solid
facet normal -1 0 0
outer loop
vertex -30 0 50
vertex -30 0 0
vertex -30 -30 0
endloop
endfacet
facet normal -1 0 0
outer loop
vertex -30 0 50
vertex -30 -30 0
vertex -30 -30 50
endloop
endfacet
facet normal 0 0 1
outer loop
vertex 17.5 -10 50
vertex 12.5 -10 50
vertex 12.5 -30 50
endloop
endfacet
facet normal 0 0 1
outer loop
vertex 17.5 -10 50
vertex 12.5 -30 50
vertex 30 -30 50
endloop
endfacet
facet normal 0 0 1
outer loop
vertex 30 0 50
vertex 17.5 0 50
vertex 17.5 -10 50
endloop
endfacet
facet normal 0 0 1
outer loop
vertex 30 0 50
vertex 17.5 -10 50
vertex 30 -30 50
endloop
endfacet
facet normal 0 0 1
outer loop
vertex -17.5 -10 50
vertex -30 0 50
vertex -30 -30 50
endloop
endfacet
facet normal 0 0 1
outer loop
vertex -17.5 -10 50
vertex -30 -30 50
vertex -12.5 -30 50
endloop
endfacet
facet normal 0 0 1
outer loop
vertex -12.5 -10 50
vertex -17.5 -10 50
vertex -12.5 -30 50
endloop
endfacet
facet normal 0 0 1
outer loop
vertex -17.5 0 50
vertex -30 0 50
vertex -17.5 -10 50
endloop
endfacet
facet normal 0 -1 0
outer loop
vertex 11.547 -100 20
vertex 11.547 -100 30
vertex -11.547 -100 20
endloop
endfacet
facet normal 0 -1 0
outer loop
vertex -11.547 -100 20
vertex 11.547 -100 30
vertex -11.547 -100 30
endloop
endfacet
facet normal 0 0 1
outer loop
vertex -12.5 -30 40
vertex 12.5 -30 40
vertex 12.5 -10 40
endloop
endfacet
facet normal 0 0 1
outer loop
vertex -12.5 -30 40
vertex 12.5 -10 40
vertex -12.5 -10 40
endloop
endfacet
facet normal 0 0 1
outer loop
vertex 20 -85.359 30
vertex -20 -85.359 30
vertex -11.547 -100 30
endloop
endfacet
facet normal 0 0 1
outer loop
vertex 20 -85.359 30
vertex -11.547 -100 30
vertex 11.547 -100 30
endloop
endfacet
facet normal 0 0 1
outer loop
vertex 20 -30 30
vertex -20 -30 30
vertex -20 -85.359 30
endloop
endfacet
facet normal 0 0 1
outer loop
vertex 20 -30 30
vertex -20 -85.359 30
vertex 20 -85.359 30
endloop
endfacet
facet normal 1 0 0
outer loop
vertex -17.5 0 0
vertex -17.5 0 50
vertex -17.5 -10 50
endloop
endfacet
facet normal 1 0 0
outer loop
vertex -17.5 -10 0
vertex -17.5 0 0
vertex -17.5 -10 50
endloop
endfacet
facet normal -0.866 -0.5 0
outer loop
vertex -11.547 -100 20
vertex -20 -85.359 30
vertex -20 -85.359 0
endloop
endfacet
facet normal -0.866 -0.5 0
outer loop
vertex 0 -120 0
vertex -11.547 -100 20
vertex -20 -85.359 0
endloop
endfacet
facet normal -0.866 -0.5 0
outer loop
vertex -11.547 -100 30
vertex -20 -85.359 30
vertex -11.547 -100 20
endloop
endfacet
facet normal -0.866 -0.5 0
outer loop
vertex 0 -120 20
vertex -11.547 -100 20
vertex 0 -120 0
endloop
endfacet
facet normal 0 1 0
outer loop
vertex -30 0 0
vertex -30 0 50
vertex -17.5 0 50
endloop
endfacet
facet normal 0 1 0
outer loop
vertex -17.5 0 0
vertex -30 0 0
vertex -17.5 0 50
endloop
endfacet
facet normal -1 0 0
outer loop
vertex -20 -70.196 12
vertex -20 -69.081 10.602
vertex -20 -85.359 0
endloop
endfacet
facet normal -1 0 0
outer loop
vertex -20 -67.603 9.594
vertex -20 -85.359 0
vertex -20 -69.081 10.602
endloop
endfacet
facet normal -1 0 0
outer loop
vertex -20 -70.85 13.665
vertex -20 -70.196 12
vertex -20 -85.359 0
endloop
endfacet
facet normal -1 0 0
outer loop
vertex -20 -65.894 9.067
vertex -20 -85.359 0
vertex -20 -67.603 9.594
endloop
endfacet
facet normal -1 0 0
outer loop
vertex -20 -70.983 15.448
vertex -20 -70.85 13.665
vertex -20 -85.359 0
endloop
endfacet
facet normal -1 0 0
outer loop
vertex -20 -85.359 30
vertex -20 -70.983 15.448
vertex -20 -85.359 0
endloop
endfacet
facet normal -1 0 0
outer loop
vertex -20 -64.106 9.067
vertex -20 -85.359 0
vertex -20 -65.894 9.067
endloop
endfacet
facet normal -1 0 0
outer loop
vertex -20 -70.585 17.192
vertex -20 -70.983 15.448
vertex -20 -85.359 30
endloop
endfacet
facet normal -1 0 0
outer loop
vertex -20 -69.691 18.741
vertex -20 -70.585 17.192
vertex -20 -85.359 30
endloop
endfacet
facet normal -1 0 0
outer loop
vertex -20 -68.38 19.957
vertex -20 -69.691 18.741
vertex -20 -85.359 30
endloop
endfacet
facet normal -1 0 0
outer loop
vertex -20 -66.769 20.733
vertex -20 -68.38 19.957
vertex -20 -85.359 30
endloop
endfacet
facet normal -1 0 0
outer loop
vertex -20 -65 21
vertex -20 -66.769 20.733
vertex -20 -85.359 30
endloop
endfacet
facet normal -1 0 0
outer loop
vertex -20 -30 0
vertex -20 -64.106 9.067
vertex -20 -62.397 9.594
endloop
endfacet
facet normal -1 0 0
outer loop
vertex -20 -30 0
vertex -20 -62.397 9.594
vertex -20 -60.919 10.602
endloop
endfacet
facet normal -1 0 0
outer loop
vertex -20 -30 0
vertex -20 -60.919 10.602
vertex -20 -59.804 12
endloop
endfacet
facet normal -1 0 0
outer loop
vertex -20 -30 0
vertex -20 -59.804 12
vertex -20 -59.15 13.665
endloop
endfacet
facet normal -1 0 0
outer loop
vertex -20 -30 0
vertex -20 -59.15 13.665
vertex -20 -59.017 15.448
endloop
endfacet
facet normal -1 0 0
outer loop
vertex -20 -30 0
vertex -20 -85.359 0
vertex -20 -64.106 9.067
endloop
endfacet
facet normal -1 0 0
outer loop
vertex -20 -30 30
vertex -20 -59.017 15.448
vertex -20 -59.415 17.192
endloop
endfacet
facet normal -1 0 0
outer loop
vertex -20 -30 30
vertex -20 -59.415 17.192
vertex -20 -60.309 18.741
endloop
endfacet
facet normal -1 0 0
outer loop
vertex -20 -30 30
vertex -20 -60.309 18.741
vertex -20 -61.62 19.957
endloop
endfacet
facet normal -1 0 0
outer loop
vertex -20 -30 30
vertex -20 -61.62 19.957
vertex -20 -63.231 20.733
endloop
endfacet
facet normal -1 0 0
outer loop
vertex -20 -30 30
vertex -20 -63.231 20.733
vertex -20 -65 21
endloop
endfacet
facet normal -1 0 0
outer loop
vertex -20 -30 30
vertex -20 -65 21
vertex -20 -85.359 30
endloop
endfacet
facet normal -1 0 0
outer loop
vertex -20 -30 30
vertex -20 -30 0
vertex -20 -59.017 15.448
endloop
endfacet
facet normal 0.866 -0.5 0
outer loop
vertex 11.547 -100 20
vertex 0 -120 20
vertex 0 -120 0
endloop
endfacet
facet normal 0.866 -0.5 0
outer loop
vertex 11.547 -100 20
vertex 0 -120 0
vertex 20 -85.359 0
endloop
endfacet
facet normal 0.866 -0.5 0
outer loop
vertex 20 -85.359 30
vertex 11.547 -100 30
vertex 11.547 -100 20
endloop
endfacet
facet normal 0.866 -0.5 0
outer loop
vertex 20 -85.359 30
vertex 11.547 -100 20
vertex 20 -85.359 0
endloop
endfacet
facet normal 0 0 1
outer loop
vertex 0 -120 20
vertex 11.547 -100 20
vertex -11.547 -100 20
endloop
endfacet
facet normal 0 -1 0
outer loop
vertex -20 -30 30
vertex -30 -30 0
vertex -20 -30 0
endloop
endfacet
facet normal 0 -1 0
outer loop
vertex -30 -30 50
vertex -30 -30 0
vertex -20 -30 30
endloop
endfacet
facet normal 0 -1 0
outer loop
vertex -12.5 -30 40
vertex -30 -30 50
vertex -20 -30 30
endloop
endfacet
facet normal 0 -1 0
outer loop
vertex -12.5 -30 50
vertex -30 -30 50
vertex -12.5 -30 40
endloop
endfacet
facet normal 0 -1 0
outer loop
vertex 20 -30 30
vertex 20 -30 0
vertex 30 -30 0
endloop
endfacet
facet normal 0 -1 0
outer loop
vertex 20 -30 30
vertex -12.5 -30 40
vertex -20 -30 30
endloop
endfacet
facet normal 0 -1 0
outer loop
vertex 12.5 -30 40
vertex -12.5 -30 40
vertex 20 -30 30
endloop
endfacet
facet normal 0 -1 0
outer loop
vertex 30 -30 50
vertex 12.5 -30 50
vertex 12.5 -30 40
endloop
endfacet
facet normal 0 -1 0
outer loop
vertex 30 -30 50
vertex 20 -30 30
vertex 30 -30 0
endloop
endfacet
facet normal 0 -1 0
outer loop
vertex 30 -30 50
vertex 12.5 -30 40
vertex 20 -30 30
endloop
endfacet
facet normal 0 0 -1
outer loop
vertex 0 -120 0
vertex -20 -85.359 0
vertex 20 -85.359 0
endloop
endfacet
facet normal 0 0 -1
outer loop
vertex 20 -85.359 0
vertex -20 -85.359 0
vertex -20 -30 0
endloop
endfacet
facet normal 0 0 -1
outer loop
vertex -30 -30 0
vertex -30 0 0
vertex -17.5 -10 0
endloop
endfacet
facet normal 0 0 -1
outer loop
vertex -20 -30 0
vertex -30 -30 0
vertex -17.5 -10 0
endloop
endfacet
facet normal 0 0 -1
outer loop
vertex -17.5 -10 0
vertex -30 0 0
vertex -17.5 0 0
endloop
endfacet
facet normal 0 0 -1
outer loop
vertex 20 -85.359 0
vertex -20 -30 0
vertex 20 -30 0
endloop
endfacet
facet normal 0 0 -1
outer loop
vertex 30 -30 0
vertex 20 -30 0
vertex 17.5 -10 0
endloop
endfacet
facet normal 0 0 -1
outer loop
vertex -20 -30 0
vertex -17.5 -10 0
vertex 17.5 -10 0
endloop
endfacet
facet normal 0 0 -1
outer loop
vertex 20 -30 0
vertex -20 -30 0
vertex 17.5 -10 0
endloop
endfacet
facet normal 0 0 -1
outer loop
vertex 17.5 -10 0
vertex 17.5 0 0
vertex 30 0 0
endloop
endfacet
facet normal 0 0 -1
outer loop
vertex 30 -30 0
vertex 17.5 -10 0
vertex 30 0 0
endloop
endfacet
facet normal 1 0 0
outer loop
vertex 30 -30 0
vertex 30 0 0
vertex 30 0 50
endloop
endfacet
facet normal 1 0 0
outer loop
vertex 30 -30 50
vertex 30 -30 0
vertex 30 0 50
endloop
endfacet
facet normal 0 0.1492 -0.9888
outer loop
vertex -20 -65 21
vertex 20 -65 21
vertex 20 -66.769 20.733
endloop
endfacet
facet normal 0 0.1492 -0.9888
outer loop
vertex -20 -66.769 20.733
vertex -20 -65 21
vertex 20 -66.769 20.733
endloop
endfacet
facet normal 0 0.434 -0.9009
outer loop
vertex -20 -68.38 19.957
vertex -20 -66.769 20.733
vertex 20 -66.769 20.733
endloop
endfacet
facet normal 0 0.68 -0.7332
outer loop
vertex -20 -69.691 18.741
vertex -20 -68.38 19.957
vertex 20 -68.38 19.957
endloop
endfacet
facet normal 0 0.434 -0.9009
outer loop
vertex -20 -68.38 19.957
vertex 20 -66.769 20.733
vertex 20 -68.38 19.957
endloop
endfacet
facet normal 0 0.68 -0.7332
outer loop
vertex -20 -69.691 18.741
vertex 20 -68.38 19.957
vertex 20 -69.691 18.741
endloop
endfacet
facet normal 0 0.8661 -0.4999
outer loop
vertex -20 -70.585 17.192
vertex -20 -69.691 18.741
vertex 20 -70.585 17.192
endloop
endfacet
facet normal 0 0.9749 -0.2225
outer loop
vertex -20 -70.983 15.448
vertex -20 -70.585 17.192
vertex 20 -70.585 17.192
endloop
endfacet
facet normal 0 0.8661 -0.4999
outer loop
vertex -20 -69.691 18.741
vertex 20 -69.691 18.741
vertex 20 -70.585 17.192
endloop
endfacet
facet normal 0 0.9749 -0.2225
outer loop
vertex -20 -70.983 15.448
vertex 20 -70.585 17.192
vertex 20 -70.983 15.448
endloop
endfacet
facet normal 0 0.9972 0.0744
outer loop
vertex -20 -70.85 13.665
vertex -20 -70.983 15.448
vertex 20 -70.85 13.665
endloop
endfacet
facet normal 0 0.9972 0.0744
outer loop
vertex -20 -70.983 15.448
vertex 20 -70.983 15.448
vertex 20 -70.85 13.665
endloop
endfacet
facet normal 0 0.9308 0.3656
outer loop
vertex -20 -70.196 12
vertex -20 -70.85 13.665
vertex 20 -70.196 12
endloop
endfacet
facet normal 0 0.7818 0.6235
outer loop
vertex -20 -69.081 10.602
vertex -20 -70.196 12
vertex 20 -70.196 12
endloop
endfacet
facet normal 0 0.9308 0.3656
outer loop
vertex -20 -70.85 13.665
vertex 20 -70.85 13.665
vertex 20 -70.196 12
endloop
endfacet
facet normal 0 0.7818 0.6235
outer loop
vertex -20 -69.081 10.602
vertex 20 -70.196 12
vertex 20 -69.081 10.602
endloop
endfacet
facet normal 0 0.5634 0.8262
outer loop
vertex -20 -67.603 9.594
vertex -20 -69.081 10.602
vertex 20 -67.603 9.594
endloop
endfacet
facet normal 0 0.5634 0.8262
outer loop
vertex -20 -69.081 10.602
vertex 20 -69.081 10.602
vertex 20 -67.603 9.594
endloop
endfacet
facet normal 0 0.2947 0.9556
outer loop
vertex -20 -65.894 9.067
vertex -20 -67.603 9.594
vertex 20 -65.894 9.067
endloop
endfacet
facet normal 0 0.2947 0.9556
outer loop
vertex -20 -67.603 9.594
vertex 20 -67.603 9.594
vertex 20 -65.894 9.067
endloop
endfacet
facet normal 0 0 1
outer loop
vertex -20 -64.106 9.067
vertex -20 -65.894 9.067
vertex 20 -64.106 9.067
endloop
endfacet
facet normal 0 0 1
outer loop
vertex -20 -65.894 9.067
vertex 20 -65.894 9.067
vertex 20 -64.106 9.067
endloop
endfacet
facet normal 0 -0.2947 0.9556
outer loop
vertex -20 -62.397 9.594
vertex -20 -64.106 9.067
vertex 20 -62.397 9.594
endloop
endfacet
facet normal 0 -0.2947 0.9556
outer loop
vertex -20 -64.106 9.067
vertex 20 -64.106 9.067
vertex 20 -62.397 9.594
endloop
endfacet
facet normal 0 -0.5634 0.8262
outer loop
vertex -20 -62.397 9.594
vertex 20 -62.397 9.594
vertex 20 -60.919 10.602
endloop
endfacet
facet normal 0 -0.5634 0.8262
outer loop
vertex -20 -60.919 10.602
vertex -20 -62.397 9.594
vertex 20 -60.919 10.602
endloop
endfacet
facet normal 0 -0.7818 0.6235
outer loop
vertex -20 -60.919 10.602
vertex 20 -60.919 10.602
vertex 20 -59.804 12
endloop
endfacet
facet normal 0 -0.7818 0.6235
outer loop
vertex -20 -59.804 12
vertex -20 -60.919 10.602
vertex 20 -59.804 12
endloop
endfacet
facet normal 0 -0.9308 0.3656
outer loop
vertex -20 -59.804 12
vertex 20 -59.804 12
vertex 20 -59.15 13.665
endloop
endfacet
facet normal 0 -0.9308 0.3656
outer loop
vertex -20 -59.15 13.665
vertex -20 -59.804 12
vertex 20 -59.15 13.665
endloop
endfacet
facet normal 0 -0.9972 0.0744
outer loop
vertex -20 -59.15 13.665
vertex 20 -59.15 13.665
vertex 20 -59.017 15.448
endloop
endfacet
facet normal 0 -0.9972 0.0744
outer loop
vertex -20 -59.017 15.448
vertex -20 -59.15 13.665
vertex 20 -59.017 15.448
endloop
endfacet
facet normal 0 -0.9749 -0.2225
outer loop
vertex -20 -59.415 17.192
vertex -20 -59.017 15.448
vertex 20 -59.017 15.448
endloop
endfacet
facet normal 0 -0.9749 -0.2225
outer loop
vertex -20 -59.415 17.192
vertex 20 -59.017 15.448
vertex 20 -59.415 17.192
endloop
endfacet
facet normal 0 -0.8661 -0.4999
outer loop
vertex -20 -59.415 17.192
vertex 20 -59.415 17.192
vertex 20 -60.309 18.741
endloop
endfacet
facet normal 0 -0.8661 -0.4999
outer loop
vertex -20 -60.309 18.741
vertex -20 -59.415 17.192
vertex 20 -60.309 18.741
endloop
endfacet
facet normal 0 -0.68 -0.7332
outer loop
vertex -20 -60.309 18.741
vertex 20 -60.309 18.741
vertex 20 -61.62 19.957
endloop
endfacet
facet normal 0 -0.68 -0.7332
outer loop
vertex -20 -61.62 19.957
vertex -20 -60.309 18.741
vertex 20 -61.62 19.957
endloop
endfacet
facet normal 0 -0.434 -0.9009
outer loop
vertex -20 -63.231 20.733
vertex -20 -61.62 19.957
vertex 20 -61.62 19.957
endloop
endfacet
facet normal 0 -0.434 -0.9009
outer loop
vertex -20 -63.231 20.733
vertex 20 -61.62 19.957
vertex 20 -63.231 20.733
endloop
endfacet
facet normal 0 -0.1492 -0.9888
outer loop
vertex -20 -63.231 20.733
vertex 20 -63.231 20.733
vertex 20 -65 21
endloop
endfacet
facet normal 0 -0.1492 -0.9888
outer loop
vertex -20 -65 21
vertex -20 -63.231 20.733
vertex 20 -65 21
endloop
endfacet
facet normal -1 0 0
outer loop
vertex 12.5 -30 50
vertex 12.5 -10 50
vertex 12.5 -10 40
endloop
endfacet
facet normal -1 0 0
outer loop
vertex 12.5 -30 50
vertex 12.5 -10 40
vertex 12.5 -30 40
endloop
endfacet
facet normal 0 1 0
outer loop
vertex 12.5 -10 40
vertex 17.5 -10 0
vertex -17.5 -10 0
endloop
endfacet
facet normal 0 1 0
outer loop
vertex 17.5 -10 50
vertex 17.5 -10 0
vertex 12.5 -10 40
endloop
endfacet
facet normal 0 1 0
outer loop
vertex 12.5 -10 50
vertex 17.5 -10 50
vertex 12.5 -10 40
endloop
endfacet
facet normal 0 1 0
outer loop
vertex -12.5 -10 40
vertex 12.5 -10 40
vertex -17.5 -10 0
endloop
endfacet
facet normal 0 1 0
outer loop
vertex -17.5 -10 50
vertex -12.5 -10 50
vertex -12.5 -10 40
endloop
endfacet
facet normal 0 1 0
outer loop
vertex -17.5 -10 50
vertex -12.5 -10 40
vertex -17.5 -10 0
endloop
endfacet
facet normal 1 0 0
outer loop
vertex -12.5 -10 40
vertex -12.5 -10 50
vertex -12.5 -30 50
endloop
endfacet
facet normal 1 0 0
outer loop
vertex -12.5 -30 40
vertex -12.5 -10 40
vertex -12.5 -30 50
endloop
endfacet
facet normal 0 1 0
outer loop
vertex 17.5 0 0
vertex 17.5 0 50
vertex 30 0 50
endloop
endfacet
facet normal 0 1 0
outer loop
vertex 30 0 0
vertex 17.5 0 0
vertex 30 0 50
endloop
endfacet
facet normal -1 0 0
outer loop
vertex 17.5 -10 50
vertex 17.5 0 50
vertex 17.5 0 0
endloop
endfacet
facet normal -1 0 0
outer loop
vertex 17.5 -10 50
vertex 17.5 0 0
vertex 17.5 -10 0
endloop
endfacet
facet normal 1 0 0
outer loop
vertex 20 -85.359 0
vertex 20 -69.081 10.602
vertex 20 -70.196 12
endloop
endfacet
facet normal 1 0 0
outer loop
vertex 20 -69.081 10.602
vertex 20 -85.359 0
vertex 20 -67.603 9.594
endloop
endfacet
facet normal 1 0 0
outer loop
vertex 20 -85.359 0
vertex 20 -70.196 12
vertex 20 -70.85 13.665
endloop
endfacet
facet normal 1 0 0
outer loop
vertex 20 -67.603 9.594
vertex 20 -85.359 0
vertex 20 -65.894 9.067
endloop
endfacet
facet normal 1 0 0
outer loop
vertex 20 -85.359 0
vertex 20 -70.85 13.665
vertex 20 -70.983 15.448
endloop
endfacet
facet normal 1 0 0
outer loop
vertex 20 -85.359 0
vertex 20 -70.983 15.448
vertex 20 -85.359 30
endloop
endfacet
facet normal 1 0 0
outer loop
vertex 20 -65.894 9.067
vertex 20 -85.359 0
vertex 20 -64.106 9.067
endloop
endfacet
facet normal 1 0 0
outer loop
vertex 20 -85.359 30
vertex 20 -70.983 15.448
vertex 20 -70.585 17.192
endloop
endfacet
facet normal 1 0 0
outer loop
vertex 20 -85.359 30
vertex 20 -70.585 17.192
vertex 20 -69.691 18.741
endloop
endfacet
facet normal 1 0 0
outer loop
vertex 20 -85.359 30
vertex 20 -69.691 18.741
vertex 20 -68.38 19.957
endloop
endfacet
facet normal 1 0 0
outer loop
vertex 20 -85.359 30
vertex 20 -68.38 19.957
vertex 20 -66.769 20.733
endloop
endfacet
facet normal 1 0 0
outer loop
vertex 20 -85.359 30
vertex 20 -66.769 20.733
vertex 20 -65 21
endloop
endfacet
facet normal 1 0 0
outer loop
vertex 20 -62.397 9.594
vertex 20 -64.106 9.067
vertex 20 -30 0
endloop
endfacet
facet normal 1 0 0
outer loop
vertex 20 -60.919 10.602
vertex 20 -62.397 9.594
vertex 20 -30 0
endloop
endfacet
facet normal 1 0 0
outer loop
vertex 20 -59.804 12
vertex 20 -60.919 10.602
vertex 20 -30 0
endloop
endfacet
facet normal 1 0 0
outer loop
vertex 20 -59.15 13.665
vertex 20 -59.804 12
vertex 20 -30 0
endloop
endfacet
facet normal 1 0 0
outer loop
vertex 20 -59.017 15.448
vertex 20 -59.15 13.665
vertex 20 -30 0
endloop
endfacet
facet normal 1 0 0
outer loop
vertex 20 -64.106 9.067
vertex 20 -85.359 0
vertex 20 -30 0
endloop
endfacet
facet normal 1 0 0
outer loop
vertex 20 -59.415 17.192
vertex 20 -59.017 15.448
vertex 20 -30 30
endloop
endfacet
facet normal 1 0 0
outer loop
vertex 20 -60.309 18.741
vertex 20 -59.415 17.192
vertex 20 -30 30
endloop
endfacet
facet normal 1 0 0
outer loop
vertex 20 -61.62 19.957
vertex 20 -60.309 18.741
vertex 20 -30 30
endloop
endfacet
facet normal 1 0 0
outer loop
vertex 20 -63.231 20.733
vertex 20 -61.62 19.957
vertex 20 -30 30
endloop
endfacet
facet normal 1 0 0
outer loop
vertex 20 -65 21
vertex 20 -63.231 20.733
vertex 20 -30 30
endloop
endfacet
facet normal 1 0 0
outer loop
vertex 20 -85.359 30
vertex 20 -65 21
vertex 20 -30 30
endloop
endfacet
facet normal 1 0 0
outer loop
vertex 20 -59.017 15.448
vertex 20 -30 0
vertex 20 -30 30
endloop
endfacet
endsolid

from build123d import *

# Parameters (mm, degrees)
SKETCH_W        = 60
SKETCH_H        = 50
PAD_DEPTH       = 30
SKETCH001_W     = 40
SKETCH001_H     = 30
PAD001_DEPTH    = 90
SKETCH002_W     = 35
SKETCH002_H     = 10
POCKET_DEPTH    = 50.001
SKETCH003_W     = 25
SKETCH003_H     = 26.623343
POCKET001_DEPTH = 10
SKETCH004_R     = 6
POCKET002_DEPTH = 50.001
POCKET003_DEPTH = 30.001
SKETCH006_W     = 62.083085
SKETCH006_H     = 25.997551
POCKET004_DEPTH = 10


with BuildPart() as part:
    # Sketch → Pad (new body)
    with BuildSketch(Plane.XZ):
        with Locations((0, 25)):
            Rectangle(SKETCH_W, SKETCH_H)
    extrude(amount=PAD_DEPTH)

    # Sketch001 → Pad001 (new body)
    with BuildSketch(Plane.XZ.offset(30)):
        with Locations((0, 15)):
            Rectangle(SKETCH001_W, SKETCH001_H)
    extrude(amount=PAD001_DEPTH)

    # Sketch002 → Pocket (cut, through all)
    with BuildSketch(Plane(origin=(0, 0, 50), x_dir=(-1, 0, 0), z_dir=(0, 0, 1))):
        with Locations((0, 5)):
            Rectangle(SKETCH002_W, SKETCH002_H)
    extrude(amount=-POCKET_DEPTH, mode=Mode.SUBTRACT)

    # Sketch003 → Pocket001 (cut)
    with BuildSketch(Plane(origin=(0, 0, 50), x_dir=(-1, 0, 0), z_dir=(0, 0, 1))):
        with Locations((0, 16.688329)):
            Rectangle(SKETCH003_W, SKETCH003_H)
    extrude(amount=-POCKET001_DEPTH, mode=Mode.SUBTRACT)

    # Sketch004 → Pocket002 (cut, through all)
    with BuildSketch(Plane(origin=(20, 0, 0), x_dir=(0, 0, 1), z_dir=(1, 0, 0))):
        with Locations((15, 65)):
            Circle(SKETCH004_R)
    extrude(amount=-POCKET002_DEPTH, mode=Mode.SUBTRACT)

    # Sketch005 → Pocket003 (cut, through all)
    with BuildSketch(Plane(origin=(0, 0, 30), x_dir=(-1, 0, 0), z_dir=(0, 0, 1))):
        Polygon((0, 120), (-25, 76.69873), (-25, 127.885117), (25, 127.885117), (25, 76.69873), align=None)
    extrude(amount=-POCKET003_DEPTH, mode=Mode.SUBTRACT)

    # Sketch006 → Pocket004 (cut)
    with BuildSketch(Plane(origin=(0, 0, 30), x_dir=(-1, 0, 0), z_dir=(0, 0, 1))):
        with Locations((1.302299, 112.998775)):
            Rectangle(SKETCH006_W, SKETCH006_H)
    extrude(amount=-POCKET004_DEPTH, mode=Mode.SUBTRACT)


solid = part.part
